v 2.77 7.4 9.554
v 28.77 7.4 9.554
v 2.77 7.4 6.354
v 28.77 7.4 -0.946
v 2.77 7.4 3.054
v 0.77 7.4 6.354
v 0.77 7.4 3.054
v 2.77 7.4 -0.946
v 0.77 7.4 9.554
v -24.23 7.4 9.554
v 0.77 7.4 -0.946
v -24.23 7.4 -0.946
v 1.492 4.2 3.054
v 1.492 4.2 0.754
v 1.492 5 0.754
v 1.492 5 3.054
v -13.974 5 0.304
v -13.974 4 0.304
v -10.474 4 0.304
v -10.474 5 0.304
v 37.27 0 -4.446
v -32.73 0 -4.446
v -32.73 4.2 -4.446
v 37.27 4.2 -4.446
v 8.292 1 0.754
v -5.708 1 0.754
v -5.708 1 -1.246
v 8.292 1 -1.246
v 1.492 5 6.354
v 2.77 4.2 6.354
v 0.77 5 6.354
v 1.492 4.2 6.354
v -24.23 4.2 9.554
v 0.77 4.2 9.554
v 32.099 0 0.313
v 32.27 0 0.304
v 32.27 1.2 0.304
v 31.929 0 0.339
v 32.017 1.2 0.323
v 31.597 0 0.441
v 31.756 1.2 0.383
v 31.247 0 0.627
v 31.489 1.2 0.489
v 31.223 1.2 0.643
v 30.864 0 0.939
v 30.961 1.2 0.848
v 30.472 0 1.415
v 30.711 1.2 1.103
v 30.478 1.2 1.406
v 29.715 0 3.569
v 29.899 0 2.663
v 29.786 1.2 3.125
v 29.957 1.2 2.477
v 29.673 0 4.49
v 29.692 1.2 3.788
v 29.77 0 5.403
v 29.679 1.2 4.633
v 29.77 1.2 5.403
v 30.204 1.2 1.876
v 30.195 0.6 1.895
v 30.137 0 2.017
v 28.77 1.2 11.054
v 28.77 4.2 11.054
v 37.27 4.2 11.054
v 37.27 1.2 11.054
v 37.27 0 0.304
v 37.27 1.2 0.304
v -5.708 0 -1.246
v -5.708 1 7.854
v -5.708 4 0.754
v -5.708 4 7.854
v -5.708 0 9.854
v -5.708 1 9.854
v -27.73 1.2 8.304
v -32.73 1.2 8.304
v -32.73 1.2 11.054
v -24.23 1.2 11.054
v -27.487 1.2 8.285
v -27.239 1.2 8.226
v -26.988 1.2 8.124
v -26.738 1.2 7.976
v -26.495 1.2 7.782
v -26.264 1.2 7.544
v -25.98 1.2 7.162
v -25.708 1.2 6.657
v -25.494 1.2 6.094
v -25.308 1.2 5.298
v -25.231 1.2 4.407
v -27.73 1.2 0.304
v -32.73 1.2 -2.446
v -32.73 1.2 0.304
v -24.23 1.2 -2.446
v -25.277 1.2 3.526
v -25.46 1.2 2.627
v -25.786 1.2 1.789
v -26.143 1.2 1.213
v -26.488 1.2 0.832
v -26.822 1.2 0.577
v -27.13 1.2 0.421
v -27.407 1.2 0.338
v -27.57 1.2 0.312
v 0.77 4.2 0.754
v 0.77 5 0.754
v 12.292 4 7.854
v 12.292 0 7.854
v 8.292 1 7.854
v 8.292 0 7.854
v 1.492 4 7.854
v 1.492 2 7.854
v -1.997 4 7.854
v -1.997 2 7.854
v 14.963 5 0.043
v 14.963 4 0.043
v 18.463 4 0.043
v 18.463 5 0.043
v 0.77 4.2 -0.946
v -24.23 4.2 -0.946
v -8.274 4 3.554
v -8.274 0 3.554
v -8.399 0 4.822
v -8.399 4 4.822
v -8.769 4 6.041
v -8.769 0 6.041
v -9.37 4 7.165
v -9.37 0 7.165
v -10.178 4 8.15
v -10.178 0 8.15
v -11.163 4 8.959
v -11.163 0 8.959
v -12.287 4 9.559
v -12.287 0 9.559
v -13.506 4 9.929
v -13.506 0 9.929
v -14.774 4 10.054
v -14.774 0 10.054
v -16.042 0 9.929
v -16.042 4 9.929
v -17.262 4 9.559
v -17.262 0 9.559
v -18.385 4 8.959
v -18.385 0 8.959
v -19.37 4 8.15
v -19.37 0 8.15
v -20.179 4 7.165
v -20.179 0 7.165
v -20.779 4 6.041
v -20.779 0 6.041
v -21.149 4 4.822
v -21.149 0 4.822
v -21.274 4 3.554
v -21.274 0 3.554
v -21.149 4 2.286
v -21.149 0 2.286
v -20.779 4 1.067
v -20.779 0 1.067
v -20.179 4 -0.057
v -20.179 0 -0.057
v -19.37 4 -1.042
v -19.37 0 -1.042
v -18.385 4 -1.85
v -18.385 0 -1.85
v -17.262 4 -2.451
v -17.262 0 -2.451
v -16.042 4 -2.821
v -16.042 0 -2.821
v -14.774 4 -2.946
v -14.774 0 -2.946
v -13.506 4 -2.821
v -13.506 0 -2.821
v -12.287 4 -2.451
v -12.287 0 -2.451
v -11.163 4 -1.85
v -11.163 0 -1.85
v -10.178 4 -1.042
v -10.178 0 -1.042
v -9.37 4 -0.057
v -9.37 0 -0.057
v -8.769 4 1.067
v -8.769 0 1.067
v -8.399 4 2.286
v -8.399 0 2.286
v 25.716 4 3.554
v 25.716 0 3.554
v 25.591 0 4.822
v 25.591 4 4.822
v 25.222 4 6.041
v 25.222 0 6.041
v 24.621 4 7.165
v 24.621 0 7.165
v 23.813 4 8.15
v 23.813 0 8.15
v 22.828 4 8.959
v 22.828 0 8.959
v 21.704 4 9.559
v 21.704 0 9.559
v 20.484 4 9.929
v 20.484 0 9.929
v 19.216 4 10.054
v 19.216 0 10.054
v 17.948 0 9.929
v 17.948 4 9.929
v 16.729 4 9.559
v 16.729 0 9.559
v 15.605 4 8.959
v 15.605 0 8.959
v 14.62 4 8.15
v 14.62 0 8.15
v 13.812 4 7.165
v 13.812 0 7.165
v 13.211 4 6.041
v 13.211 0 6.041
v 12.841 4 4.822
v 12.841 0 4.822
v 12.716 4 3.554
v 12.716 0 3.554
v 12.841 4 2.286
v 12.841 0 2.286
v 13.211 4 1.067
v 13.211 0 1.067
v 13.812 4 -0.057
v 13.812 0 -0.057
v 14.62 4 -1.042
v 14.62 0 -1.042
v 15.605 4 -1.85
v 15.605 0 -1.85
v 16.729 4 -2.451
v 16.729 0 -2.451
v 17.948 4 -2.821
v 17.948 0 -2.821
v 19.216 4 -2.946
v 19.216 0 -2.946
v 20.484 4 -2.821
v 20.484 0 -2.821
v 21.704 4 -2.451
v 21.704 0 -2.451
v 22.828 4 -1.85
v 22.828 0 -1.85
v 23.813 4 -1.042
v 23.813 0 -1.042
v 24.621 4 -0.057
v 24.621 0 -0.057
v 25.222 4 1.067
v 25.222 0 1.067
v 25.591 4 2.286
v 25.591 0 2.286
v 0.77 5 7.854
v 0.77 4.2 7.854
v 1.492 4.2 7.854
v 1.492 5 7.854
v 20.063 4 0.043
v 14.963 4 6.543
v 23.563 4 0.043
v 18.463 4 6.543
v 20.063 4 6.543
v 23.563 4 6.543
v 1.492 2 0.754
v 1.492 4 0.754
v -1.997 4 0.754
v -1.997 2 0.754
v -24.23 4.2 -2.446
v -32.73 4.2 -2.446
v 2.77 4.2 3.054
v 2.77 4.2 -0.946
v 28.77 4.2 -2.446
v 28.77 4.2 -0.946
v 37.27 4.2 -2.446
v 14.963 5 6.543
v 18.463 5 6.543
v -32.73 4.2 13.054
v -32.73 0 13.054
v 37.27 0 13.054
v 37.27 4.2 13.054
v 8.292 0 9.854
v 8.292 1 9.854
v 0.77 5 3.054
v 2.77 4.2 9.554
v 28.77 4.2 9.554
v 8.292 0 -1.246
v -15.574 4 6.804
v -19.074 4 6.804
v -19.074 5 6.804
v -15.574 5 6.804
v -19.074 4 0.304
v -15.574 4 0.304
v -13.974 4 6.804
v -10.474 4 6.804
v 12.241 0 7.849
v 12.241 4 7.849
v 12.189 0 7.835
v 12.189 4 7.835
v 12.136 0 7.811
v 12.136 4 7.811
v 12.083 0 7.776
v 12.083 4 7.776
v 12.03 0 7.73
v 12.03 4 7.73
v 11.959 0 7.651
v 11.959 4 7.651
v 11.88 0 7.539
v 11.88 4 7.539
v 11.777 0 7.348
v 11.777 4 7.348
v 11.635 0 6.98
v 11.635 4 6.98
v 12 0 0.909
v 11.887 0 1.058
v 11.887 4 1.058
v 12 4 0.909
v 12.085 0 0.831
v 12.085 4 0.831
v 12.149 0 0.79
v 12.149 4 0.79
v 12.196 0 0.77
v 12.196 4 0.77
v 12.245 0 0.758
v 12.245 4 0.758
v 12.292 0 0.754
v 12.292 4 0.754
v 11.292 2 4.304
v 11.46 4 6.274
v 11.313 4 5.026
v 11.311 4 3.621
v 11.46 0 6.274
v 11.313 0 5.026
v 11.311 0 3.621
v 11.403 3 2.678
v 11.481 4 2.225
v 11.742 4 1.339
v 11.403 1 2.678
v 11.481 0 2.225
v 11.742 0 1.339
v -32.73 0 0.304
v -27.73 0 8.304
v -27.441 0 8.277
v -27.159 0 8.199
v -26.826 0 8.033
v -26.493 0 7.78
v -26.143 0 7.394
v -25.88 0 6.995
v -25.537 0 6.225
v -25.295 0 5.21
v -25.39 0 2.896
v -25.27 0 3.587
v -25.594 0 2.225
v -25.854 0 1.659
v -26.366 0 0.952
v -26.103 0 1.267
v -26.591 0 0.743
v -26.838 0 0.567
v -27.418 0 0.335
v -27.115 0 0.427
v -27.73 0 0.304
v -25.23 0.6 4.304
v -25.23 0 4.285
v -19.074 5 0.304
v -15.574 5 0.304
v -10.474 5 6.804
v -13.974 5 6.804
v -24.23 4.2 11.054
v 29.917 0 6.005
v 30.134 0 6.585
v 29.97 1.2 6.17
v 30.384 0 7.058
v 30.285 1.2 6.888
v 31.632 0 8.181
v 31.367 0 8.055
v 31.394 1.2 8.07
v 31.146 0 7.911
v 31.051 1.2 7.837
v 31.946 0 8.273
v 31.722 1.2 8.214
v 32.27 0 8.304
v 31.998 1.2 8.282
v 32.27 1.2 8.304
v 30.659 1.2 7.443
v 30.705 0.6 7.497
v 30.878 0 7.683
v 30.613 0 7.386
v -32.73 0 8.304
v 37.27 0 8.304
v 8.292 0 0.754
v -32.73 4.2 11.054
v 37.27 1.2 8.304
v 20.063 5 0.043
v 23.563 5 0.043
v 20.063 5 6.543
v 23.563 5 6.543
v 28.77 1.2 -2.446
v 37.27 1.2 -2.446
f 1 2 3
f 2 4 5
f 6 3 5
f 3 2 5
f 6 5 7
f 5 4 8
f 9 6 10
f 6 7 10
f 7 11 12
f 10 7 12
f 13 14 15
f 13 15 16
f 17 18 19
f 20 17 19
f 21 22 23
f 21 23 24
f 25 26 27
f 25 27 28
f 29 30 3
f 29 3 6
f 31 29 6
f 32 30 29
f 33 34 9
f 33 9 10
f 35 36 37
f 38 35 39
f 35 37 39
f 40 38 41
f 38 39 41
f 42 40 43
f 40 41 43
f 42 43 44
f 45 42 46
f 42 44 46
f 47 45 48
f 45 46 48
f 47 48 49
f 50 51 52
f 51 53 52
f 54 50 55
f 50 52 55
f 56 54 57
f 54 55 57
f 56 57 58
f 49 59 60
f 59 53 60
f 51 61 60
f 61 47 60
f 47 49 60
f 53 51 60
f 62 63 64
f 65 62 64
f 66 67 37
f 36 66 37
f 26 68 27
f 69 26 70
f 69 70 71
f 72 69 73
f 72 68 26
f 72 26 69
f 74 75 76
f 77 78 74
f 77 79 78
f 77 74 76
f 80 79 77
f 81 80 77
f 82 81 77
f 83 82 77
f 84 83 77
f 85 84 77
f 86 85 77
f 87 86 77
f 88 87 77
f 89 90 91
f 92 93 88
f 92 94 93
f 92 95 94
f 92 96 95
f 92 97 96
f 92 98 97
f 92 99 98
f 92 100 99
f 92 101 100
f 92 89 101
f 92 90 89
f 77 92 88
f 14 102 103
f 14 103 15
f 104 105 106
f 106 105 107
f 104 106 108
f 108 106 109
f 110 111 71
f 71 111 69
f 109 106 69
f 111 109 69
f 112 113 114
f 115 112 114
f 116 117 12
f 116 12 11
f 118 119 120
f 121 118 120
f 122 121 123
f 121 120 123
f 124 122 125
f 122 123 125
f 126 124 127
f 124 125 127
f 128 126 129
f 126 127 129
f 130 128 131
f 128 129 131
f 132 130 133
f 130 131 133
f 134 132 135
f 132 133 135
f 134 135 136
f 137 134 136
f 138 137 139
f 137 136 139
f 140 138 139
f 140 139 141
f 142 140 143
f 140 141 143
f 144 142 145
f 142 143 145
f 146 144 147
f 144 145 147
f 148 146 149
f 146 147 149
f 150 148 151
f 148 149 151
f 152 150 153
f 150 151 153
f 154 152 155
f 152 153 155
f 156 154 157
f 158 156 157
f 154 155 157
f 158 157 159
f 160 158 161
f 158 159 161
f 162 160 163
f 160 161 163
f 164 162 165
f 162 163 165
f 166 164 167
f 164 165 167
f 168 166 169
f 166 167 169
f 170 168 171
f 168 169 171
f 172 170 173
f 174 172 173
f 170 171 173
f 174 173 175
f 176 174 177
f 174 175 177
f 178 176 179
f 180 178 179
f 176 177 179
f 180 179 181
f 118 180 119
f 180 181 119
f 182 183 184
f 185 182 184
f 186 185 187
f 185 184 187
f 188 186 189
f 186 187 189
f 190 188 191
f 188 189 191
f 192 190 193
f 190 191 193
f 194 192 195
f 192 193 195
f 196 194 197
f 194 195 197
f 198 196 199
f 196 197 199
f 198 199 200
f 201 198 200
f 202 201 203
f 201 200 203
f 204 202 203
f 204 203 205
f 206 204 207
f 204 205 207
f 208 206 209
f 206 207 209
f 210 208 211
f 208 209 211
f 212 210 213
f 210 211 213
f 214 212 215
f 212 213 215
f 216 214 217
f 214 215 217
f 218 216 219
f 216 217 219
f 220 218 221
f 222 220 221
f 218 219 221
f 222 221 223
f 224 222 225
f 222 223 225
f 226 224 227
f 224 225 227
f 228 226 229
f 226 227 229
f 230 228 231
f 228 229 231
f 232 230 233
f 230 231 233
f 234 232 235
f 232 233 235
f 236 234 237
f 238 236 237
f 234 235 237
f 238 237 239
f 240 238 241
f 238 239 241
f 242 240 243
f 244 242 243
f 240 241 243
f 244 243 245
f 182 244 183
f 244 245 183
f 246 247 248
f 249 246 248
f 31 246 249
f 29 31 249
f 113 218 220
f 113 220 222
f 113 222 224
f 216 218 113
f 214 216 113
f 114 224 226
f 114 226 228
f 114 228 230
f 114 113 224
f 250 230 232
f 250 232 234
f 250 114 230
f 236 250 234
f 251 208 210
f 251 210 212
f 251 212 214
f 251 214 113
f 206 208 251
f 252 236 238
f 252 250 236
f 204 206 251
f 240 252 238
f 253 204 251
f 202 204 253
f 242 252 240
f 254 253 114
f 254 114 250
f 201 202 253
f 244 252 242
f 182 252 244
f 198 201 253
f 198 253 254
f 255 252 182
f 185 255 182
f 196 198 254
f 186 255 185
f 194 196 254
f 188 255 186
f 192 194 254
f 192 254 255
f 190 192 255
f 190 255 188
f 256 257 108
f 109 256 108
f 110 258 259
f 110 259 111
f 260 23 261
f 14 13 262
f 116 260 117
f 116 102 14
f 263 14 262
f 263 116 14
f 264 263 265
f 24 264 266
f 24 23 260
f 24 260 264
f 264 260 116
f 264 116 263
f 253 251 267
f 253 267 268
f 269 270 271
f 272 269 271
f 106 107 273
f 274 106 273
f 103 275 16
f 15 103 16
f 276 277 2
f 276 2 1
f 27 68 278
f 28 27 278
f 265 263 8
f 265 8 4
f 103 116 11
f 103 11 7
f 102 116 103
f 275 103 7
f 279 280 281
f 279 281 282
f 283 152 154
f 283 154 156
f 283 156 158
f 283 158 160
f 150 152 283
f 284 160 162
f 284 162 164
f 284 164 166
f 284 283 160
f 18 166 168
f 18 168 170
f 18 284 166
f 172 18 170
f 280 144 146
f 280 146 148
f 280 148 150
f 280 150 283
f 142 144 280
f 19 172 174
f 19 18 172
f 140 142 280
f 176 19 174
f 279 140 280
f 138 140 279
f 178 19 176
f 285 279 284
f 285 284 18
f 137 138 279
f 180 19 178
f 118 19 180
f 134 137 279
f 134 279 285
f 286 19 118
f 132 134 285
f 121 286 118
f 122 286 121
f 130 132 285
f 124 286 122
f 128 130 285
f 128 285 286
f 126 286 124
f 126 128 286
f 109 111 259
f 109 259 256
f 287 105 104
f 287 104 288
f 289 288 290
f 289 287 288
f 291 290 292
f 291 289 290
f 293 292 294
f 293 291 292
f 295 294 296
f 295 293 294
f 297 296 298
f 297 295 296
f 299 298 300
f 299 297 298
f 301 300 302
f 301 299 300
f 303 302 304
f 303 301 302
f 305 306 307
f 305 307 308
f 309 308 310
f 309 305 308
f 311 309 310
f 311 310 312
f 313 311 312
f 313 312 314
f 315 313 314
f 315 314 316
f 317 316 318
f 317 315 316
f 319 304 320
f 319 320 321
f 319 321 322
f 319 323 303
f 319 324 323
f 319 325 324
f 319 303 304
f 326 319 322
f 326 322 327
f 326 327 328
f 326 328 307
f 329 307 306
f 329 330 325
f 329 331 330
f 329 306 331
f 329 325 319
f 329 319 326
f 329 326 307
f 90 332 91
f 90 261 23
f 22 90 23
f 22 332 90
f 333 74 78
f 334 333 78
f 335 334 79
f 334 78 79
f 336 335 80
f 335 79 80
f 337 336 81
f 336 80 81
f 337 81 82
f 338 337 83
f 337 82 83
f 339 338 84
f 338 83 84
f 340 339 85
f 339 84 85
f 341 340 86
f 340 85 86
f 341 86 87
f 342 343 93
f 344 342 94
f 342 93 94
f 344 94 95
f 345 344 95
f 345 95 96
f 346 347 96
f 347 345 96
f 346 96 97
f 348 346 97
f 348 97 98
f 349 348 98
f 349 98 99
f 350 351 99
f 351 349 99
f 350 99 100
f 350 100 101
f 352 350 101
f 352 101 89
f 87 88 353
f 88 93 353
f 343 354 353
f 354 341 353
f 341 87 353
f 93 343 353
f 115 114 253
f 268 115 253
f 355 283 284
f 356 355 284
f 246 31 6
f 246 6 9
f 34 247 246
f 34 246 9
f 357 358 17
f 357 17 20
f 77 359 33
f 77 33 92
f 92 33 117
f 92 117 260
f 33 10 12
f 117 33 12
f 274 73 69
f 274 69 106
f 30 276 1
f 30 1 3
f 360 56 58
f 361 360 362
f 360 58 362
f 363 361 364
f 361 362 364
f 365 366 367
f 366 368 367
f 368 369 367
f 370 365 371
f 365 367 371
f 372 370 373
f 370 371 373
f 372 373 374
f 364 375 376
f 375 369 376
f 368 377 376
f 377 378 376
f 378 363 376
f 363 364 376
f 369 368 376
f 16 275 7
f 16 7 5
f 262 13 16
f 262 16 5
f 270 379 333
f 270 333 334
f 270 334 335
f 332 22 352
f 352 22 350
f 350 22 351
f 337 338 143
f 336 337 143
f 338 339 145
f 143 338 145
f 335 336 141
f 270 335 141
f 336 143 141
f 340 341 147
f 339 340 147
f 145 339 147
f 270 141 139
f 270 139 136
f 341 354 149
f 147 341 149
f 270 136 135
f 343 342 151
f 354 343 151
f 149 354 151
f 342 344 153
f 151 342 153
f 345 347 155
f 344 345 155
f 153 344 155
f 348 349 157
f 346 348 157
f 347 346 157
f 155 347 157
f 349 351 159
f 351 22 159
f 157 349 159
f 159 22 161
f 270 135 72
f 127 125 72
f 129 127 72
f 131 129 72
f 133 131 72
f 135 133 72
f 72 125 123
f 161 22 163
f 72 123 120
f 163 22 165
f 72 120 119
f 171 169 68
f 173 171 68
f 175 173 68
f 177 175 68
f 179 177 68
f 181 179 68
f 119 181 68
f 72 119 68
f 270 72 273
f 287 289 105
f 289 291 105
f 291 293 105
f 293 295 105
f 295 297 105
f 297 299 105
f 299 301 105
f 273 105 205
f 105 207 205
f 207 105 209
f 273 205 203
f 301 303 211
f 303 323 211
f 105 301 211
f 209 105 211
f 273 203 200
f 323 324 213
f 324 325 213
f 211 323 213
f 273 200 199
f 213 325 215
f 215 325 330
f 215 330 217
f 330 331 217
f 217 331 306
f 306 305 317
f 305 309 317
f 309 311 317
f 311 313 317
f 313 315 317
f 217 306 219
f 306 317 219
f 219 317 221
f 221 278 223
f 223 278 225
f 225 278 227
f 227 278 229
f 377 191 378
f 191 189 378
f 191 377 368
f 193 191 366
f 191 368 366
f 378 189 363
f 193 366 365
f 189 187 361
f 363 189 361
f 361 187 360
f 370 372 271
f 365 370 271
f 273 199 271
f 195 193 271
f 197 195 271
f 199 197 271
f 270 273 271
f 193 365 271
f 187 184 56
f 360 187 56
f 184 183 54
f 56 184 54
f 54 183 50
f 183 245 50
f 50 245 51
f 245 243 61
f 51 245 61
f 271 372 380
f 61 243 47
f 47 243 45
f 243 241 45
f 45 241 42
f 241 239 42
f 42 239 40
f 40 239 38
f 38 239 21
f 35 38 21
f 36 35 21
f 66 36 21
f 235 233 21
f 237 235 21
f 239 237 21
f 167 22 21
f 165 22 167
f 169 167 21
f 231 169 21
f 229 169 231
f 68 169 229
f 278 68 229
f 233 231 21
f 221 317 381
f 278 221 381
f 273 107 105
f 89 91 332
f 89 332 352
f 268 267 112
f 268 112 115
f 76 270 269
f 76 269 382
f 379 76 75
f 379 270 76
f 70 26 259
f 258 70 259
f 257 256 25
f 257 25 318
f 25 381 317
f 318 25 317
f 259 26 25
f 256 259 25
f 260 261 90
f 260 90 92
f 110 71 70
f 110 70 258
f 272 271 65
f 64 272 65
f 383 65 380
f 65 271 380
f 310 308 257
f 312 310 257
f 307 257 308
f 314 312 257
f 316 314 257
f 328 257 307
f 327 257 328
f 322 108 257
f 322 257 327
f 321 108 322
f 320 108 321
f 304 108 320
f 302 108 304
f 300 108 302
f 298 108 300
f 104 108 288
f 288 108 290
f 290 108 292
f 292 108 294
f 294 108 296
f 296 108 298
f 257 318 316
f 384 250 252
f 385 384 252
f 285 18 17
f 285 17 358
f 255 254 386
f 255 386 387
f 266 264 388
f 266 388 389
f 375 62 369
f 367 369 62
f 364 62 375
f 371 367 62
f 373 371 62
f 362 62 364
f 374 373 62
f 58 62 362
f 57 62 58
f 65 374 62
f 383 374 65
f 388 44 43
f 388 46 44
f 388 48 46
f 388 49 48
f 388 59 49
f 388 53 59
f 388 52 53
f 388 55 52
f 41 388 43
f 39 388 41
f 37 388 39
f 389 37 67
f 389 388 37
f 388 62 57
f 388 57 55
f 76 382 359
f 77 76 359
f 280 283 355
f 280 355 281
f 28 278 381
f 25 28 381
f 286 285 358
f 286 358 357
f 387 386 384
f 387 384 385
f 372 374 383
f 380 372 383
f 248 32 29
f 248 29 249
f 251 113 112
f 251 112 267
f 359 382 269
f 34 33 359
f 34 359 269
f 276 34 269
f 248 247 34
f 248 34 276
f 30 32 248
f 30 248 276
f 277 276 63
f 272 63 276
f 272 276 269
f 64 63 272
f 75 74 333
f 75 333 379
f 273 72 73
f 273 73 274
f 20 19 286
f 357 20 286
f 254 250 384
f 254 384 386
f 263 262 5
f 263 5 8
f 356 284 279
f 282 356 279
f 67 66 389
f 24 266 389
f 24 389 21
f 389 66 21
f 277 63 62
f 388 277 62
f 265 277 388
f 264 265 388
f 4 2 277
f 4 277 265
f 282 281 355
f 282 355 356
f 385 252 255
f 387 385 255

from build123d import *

# Parameters (mm, degrees)
CROQUIS1_W                   = 70
CROQUIS1_H                   = 17.5
SALIENTE_EXTRUIR1_DEPTH      = 4.2
CROQUIS2_W                   = 8.5
CROQUIS2_H                   = 13.5
CORTAR_EXTRUIR1_DEPTH        = 3
CORTAR_EXTRUIR2_DEPTH        = 2.2
SALIENTE_EXTRUIR2_DEPTH      = 3.2
CROQUIS5_R                   = 6.5
CORTAR_EXTRUIR3_DEPTH        = 4
CROQUIS6_W                   = 3.5
CROQUIS6_H                   = 6.5
CORTAR_EXTRUIR4_DEPTH        = 1
CROQUIS7_W                   = 14
CROQUIS7_H                   = 2
CORTAR_EXTRUIR5_DEPTH        = 1
CORTAR_EXTRUIR6_DEPTH        = 4
CROQUIS9_W                   = 3.489148649
CROQUIS9_H                   = 7.1
SALIENTE_EXTRUIR3_DEPTH      = 2
SALIENTE_EXTRUIR3_DEPTH_BACK = 1


with BuildPart() as part:
    # Croquis1 → Saliente-Extruir1 (new body)
    with BuildSketch(Plane(origin=(0, 0, 0), x_dir=(1, 0, 0), z_dir=(0, 1, 0))):
        with Locations((2.27027027, -4.304054054)):
            Rectangle(CROQUIS1_W, CROQUIS1_H)
    extrude(amount=SALIENTE_EXTRUIR1_DEPTH)

    # Croquis2 → Cortar-Extruir1 (cut)
    with BuildSketch(Plane(origin=(0, 4.2, 0), x_dir=(1, 0, 0), z_dir=(0, 1, 0))):
        with Locations((33.02027027, -4.304054054)):
            Rectangle(CROQUIS2_W, CROQUIS2_H)
        with Locations((-28.47972973, -4.304054054)):
            Rectangle(CROQUIS2_W, CROQUIS2_H)
    extrude(amount=-CORTAR_EXTRUIR1_DEPTH, mode=Mode.SUBTRACT)

    # Croquis3 → Cortar-Extruir2 (cut, through all)
    with BuildSketch(Plane(origin=(0, 1.2, 0), x_dir=(1, 0, 0), z_dir=(0, 1, 0))):
        with BuildLine():
            Line((37.27027027, -0.304054054), (32.27027027, -0.304054054))
            add(Edge.make_bspline(
                [(32.27027027, -0.304054054), (28.823561714, -0.304054054), (29.77027027, -5.402735351)],
                knots=[0, 0, 0, 1.84904315, 1.84904315, 1.84904315], degree=2, weights=[1, 0.602216604, 1]))
            add(Edge.make_bspline(
                [(29.77027027, -5.402735351), (30.308978827, -8.304054054), (32.27027027, -8.304054054)],
                knots=[4.990635803, 4.990635803, 4.990635803, 6.283185307, 6.283185307, 6.283185307], degree=2, weights=[1, 0.798332739, 1]))
            Line((32.27027027, -8.304054054), (37.27027027, -8.304054054))
            Line((37.27027027, -8.304054054), (37.27027027, -0.304054054))
        make_face()
        with BuildLine():
            Line((-32.72972973, -0.304054054), (-27.72972973, -0.304054054))
            add(Edge.make_bspline(
                [(-25.22972973, -4.304054054), (-25.22972973, -0.304054054), (-27.72972973, -0.304054054)],
                knots=[4.71238898, 4.71238898, 4.71238898, 6.283185307, 6.283185307, 6.283185307], degree=2, weights=[1, 0.707106781, 1]))
            add(Edge.make_bspline(
                [(-27.72972973, -8.304054054), (-25.22972973, -8.304054054), (-25.22972973, -4.304054054)],
                knots=[3.141592654, 3.141592654, 3.141592654, 4.71238898, 4.71238898, 4.71238898], degree=2, weights=[1, 0.707106781, 1]))
            Line((-27.72972973, -8.304054054), (-32.72972973, -8.304054054))
            Line((-32.72972973, -8.304054054), (-32.72972973, -0.304054054))
        make_face()
    extrude(amount=-CORTAR_EXTRUIR2_DEPTH, mode=Mode.SUBTRACT)

    # Croquis4 → Saliente-Extruir2 (add)
    with BuildSketch(Plane(origin=(0, 4.2, 0), x_dir=(1, 0, 0), z_dir=(0, 1, 0))):
        Polygon((-24.22972973, 0.945945946), (0.77027027, 0.945945946), (0.77027027, -3.054054054), (2.77027027, -3.054054054), (2.77027027, 0.945945946), (28.77027027, 0.945945946), (28.77027027, -9.554054054), (2.77027027, -9.554054054), (2.77027027, -6.354054054), (0.77027027, -6.354054054), (0.77027027, -9.554054054), (-24.22972973, -9.554054054), align=None)
    extrude(amount=SALIENTE_EXTRUIR2_DEPTH)

    # Croquis5 → Cortar-Extruir3 (cut)
    with BuildSketch(Plane.XZ):
        with Locations((-14.774068223, 3.554054054)):
            Circle(CROQUIS5_R)
        with Locations((19.216382303, 3.554054054)):
            Circle(CROQUIS5_R)
    extrude(amount=-CORTAR_EXTRUIR3_DEPTH, mode=Mode.SUBTRACT)

    # Croquis6 → Cortar-Extruir4 (cut)
    with BuildSketch(Plane.XZ.offset(-4)):
        with Locations((-17.324068223, 3.554054054)):
            Rectangle(CROQUIS6_W, CROQUIS6_H)
        with Locations((-12.224068223, 3.554054054)):
            Rectangle(CROQUIS6_W, CROQUIS6_H)
        with Locations((16.712940217, 3.293189119)):
            Rectangle(CROQUIS6_W, CROQUIS6_H)
        with Locations((21.812940217, 3.293189119)):
            Rectangle(CROQUIS6_W, CROQUIS6_H)
    extrude(amount=-CORTAR_EXTRUIR4_DEPTH, mode=Mode.SUBTRACT)

    # Croquis7 → Cortar-Extruir5 (cut)
    with BuildSketch(Plane.XZ):
        with Locations((1.291935528, -0.245945946)):
            Rectangle(CROQUIS7_W, CROQUIS7_H)
        with Locations((1.291935528, 8.854054054)):
            Rectangle(CROQUIS7_W, CROQUIS7_H)
    extrude(amount=-CORTAR_EXTRUIR5_DEPTH, mode=Mode.SUBTRACT)

    # Croquis8 → Cortar-Extruir6 (cut)
    with BuildSketch(Plane.XZ):
        with BuildLine():
            Line((-5.708064472, 7.854054054), (-5.708064472, 0.754054054))
            Line((-5.708064472, 0.754054054), (8.291935528, 0.754054054))
            Line((8.291935528, 0.754054054), (12.291935528, 0.754054054))
            add(Edge.make_bspline(
                [(11.291935528, 4.304054054), (11.291935528, 0.754054054), (12.291935528, 0.754054054)],
                knots=[1.570796327, 1.570796327, 1.570796327, 3.141592654, 3.141592654, 3.141592654], degree=2, weights=[1, 0.707106781, 1]))
            add(Edge.make_bspline(
                [(12.291935528, 7.854054054), (11.291935528, 7.854054054), (11.291935528, 4.304054054)],
                knots=[0, 0, 0, 1.570796327, 1.570796327, 1.570796327], degree=2, weights=[1, 0.707106781, 1]))
            Line((12.291935528, 7.854054054), (8.291935528, 7.854054054))
            Line((8.291935528, 7.854054054), (-5.708064472, 7.854054054))
        make_face()
    extrude(amount=-CORTAR_EXTRUIR6_DEPTH, mode=Mode.SUBTRACT)

    # Croquis9 → Saliente-Extruir3 (add, two sides)
    with BuildSketch(Plane.XZ.offset(-4)) as saliente_extruir3_sk:
        with Locations((-0.252638796, 4.304054054)):
            Rectangle(CROQUIS9_W, CROQUIS9_H)
    extrude(amount=SALIENTE_EXTRUIR3_DEPTH)
    extrude(saliente_extruir3_sk.sketch, amount=-SALIENTE_EXTRUIR3_DEPTH_BACK)


solid = part.part
